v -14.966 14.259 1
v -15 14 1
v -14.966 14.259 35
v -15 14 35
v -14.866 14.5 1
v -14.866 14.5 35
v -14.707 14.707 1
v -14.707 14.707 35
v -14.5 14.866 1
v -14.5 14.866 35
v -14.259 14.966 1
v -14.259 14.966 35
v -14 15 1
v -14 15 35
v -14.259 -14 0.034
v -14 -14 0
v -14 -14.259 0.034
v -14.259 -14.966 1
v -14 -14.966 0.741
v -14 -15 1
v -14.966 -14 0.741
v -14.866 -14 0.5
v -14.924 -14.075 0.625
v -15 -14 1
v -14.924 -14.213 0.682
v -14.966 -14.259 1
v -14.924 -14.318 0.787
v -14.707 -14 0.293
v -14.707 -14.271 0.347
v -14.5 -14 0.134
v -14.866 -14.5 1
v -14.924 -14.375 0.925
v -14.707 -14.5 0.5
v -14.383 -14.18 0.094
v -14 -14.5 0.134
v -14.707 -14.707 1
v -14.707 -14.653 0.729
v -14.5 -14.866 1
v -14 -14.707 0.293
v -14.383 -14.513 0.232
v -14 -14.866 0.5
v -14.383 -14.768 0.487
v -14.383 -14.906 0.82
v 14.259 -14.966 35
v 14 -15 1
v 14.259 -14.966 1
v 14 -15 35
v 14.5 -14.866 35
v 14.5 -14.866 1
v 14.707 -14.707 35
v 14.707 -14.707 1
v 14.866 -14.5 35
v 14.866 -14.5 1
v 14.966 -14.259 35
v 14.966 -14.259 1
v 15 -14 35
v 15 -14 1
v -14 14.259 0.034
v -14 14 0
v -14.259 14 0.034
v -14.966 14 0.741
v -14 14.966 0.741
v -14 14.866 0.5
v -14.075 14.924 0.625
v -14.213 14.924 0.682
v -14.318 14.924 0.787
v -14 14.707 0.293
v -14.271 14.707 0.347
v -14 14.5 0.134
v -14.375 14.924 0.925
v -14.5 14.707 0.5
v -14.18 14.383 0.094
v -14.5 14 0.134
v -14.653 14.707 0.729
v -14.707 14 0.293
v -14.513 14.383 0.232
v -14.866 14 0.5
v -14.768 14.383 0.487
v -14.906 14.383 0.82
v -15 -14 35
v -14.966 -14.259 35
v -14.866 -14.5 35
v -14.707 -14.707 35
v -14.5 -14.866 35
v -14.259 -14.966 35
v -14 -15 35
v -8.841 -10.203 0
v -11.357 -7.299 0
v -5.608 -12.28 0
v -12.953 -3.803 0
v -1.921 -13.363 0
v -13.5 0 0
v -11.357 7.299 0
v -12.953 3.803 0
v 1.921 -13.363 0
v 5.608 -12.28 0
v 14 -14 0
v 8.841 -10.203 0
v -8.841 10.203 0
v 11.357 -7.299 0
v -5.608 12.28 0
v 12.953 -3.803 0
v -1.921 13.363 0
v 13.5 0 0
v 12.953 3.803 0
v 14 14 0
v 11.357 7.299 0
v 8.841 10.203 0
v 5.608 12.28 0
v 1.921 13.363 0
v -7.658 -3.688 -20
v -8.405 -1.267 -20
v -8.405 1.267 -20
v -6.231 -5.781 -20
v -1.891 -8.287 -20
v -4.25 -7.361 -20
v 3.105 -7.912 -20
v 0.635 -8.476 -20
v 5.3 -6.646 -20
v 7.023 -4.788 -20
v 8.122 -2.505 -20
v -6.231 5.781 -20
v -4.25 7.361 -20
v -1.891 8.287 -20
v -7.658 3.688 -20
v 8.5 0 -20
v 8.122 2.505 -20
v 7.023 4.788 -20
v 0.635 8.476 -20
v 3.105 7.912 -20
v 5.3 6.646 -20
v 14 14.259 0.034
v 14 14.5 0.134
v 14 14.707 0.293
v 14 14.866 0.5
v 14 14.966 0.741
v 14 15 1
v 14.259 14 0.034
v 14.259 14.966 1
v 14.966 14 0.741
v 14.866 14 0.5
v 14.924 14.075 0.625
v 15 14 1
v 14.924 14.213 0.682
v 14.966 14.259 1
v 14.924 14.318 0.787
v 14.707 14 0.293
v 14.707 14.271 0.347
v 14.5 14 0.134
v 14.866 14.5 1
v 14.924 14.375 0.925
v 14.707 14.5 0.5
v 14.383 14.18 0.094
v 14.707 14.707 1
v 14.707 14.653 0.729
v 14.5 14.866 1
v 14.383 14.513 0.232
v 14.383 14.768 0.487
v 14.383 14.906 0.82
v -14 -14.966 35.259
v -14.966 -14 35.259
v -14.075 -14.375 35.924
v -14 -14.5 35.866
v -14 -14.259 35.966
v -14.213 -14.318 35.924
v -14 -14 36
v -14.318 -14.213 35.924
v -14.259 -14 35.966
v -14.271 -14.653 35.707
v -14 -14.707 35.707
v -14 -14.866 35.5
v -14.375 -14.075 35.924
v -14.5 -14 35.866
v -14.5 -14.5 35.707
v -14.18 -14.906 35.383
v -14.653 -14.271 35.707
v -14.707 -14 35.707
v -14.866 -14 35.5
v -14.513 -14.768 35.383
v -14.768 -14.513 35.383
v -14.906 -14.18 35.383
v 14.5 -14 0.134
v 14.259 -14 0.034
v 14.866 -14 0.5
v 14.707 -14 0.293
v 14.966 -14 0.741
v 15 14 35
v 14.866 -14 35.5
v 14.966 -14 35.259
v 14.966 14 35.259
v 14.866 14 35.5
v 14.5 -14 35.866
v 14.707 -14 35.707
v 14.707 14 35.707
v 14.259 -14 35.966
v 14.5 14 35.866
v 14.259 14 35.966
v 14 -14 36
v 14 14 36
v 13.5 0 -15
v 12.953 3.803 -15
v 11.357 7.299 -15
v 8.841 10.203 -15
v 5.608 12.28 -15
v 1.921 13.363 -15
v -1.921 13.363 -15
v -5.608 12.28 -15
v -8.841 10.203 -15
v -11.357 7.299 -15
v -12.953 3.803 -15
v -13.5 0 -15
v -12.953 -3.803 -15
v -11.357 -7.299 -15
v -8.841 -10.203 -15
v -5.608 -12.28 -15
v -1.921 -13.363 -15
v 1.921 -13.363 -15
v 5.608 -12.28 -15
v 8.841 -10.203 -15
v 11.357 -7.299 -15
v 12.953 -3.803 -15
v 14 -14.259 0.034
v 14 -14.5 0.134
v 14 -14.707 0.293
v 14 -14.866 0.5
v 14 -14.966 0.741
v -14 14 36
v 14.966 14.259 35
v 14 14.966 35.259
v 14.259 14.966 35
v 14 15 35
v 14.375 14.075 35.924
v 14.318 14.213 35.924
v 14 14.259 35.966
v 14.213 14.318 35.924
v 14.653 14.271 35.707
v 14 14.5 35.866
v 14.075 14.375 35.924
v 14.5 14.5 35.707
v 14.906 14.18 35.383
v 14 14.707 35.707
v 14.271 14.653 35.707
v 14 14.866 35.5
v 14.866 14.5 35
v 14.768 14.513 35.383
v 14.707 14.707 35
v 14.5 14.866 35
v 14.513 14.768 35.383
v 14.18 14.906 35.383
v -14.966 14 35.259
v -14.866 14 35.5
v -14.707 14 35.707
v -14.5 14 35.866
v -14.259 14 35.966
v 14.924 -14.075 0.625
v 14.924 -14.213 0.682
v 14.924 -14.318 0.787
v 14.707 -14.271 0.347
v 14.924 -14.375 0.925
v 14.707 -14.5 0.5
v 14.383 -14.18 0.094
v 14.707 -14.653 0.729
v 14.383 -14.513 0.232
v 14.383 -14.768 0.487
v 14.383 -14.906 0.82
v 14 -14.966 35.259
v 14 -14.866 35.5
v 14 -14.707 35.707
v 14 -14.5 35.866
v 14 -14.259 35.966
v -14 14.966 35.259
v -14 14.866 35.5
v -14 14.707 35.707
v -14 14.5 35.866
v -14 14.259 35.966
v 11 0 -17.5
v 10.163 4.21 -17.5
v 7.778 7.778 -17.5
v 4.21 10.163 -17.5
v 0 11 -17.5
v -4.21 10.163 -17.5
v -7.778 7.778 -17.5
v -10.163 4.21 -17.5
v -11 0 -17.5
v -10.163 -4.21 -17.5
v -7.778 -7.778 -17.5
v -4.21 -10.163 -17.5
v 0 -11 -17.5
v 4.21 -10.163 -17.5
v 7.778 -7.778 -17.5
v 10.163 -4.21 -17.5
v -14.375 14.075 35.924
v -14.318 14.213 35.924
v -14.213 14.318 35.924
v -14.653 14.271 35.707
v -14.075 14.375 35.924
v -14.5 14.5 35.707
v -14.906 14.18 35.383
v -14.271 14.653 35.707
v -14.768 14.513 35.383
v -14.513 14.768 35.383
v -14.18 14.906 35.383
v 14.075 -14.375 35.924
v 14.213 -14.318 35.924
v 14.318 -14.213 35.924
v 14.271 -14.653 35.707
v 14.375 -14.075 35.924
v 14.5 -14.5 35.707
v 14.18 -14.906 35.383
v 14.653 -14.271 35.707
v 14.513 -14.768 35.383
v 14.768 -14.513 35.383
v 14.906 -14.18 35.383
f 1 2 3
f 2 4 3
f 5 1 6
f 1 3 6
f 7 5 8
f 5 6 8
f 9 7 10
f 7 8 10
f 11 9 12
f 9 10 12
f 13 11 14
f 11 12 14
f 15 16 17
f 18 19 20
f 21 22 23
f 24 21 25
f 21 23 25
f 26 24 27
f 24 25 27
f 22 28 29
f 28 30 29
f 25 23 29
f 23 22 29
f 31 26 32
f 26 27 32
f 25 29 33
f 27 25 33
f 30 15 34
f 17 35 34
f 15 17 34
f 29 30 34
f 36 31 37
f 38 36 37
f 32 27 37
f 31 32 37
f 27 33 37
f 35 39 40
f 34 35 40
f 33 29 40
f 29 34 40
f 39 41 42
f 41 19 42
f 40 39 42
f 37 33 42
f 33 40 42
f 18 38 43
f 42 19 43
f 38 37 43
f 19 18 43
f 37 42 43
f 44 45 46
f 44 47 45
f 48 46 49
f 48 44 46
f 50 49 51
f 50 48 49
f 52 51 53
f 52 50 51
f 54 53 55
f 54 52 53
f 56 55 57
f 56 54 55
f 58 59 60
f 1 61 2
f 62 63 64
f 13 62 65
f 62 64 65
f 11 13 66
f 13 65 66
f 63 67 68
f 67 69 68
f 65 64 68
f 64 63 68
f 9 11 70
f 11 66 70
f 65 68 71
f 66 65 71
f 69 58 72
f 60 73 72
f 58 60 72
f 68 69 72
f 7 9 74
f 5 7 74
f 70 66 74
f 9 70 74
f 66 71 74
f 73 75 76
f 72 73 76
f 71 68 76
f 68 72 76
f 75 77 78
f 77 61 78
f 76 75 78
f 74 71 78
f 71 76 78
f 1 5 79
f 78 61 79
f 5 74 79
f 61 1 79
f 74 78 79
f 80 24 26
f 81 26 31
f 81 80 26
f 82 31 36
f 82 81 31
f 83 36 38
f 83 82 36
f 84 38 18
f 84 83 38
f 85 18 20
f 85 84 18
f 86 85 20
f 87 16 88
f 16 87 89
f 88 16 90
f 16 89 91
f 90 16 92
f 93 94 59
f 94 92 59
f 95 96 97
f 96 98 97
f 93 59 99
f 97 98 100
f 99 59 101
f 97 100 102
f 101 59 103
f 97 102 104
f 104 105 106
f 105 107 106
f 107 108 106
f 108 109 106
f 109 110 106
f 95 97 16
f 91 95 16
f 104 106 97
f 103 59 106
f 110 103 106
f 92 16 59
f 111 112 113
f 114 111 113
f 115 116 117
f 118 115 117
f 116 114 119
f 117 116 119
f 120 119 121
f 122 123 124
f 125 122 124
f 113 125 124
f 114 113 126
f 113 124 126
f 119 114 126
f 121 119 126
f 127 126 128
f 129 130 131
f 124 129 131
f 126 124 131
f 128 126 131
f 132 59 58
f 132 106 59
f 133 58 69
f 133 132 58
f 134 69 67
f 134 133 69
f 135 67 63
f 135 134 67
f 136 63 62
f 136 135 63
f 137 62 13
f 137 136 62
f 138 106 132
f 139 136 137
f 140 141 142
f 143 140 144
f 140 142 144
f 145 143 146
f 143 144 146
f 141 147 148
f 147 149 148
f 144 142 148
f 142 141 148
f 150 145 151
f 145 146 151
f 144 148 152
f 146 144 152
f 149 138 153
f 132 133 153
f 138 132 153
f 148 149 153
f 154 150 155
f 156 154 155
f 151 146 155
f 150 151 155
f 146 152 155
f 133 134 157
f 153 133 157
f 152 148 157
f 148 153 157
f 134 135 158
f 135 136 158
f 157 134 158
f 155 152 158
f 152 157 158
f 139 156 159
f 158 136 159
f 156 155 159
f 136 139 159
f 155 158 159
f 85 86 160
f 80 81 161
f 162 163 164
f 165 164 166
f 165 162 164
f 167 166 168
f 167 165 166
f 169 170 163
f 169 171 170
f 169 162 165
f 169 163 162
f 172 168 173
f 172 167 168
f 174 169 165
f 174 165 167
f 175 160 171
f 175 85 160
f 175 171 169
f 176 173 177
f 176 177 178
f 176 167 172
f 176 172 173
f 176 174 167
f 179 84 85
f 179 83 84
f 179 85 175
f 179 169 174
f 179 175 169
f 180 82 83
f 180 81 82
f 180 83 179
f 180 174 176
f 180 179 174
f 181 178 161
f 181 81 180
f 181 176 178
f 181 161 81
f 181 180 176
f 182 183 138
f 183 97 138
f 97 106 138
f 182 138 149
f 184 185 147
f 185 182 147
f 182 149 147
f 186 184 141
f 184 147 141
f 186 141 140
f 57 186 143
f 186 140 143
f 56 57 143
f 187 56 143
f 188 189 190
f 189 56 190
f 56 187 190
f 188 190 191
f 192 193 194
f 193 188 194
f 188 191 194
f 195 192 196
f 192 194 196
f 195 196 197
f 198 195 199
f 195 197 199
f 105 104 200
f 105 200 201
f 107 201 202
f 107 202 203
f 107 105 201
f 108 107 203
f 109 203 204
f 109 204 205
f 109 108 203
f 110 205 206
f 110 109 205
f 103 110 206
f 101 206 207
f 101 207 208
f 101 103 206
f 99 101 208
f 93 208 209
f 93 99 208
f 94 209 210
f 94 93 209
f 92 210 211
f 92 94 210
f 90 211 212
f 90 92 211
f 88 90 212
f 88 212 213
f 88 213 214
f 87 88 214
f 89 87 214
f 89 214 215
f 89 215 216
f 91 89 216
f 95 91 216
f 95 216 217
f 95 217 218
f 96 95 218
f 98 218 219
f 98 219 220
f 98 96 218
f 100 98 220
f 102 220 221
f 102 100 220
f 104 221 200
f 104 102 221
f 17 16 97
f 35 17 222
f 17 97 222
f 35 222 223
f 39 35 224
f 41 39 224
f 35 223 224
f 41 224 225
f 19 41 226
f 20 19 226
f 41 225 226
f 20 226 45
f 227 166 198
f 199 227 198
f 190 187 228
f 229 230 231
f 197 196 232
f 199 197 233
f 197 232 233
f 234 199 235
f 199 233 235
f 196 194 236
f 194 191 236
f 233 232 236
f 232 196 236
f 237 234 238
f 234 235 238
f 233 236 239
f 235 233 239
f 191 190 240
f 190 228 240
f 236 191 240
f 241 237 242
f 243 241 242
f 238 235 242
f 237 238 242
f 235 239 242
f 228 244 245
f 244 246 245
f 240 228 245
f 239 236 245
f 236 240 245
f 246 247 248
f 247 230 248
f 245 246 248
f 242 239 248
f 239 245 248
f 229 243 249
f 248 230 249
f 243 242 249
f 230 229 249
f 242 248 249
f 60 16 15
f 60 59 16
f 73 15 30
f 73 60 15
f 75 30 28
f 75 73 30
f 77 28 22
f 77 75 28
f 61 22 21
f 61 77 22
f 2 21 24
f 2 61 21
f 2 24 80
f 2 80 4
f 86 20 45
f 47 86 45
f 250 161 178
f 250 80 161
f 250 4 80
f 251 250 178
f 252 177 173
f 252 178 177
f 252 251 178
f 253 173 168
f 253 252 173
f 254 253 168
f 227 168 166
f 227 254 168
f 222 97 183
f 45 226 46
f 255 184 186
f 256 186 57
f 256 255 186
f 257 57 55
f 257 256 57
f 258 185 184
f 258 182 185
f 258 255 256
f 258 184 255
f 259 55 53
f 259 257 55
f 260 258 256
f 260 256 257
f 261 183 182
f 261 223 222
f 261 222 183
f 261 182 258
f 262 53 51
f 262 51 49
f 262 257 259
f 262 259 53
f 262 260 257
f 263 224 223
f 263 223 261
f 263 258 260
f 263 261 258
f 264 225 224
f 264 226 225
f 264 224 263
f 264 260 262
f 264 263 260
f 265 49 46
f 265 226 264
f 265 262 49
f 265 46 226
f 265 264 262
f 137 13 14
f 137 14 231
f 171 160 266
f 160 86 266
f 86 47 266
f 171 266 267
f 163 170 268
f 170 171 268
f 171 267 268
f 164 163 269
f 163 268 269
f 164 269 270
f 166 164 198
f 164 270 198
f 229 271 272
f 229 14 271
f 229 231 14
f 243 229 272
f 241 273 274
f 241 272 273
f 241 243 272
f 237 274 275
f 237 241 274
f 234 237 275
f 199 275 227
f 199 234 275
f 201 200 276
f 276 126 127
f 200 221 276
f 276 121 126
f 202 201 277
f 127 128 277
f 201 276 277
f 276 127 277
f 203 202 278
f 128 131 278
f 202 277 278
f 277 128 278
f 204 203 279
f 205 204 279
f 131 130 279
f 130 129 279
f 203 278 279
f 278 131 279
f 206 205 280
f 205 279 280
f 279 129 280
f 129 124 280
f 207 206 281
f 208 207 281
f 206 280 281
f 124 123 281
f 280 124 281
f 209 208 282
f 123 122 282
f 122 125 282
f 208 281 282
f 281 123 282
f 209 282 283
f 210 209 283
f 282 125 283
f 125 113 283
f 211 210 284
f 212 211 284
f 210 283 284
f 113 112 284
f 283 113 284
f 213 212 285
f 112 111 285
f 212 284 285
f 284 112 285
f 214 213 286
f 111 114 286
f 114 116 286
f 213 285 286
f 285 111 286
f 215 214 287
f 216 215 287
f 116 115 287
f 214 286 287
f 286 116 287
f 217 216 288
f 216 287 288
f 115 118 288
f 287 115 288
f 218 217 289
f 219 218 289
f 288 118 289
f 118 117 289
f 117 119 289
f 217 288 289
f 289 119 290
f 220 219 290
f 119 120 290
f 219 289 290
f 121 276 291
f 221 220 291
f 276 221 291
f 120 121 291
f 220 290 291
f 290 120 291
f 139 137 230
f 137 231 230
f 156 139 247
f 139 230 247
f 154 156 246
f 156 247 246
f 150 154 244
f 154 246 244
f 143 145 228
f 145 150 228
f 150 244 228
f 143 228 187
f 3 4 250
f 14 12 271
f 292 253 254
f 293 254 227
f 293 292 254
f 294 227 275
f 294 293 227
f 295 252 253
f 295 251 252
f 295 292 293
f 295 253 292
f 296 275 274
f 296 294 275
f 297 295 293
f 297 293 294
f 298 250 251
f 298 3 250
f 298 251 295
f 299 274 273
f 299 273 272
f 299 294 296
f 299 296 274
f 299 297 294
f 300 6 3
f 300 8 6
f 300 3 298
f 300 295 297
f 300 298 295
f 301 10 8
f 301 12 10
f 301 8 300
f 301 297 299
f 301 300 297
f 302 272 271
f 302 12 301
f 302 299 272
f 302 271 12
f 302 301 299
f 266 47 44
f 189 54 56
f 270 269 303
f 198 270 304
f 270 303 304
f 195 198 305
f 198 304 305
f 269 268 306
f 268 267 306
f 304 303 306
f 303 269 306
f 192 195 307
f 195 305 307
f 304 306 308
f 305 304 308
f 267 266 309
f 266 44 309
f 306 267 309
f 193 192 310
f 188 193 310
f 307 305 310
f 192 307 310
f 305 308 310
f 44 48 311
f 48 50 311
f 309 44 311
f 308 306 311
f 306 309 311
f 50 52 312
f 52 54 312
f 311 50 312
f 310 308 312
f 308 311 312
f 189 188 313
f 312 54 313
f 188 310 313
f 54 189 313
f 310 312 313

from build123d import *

# Parameters (mm, degrees)
F0_W     = 30
F0_H     = 30
F1_DEPTH = 36
F2_R     = 13.5
F3_DEPTH = 20
F4_SIZE  = 5
F5_R     = 1


with BuildPart() as f1:
    # F0 (on Top) → F1 (new body)
    with BuildSketch(Plane.XY):
        Rectangle(F0_W, F0_H)
    extrude(amount=F1_DEPTH)

    # F2 (on Top) → F3 (join)
    with BuildSketch(Plane.XY):
        Circle(F2_R)
    extrude(amount=-F3_DEPTH)

    # F4
    f4_edges = [f1.edges().sort_by_distance(p)[0] for p in [
        (-13.5, 0, -20),
    ]]
    chamfer(f4_edges, length=F4_SIZE)

    # F5
    f5_edges = [f1.edges().sort_by_distance(p)[0] for p in [
        (0, -15, 0),
        (-15, 0, 0),
        (0, 15, 0),
        (15, 0, 0),
        (15, -15, 18),
        (-15, -15, 18),
        (-15, 15, 18),
        (15, 15, 18),
        (0, -15, 36),
        (-15, 0, 36),
        (15, 0, 36),
        (0, 15, 36),
    ]]
    fillet(f5_edges, radius=F5_R)


solid = f1.part
